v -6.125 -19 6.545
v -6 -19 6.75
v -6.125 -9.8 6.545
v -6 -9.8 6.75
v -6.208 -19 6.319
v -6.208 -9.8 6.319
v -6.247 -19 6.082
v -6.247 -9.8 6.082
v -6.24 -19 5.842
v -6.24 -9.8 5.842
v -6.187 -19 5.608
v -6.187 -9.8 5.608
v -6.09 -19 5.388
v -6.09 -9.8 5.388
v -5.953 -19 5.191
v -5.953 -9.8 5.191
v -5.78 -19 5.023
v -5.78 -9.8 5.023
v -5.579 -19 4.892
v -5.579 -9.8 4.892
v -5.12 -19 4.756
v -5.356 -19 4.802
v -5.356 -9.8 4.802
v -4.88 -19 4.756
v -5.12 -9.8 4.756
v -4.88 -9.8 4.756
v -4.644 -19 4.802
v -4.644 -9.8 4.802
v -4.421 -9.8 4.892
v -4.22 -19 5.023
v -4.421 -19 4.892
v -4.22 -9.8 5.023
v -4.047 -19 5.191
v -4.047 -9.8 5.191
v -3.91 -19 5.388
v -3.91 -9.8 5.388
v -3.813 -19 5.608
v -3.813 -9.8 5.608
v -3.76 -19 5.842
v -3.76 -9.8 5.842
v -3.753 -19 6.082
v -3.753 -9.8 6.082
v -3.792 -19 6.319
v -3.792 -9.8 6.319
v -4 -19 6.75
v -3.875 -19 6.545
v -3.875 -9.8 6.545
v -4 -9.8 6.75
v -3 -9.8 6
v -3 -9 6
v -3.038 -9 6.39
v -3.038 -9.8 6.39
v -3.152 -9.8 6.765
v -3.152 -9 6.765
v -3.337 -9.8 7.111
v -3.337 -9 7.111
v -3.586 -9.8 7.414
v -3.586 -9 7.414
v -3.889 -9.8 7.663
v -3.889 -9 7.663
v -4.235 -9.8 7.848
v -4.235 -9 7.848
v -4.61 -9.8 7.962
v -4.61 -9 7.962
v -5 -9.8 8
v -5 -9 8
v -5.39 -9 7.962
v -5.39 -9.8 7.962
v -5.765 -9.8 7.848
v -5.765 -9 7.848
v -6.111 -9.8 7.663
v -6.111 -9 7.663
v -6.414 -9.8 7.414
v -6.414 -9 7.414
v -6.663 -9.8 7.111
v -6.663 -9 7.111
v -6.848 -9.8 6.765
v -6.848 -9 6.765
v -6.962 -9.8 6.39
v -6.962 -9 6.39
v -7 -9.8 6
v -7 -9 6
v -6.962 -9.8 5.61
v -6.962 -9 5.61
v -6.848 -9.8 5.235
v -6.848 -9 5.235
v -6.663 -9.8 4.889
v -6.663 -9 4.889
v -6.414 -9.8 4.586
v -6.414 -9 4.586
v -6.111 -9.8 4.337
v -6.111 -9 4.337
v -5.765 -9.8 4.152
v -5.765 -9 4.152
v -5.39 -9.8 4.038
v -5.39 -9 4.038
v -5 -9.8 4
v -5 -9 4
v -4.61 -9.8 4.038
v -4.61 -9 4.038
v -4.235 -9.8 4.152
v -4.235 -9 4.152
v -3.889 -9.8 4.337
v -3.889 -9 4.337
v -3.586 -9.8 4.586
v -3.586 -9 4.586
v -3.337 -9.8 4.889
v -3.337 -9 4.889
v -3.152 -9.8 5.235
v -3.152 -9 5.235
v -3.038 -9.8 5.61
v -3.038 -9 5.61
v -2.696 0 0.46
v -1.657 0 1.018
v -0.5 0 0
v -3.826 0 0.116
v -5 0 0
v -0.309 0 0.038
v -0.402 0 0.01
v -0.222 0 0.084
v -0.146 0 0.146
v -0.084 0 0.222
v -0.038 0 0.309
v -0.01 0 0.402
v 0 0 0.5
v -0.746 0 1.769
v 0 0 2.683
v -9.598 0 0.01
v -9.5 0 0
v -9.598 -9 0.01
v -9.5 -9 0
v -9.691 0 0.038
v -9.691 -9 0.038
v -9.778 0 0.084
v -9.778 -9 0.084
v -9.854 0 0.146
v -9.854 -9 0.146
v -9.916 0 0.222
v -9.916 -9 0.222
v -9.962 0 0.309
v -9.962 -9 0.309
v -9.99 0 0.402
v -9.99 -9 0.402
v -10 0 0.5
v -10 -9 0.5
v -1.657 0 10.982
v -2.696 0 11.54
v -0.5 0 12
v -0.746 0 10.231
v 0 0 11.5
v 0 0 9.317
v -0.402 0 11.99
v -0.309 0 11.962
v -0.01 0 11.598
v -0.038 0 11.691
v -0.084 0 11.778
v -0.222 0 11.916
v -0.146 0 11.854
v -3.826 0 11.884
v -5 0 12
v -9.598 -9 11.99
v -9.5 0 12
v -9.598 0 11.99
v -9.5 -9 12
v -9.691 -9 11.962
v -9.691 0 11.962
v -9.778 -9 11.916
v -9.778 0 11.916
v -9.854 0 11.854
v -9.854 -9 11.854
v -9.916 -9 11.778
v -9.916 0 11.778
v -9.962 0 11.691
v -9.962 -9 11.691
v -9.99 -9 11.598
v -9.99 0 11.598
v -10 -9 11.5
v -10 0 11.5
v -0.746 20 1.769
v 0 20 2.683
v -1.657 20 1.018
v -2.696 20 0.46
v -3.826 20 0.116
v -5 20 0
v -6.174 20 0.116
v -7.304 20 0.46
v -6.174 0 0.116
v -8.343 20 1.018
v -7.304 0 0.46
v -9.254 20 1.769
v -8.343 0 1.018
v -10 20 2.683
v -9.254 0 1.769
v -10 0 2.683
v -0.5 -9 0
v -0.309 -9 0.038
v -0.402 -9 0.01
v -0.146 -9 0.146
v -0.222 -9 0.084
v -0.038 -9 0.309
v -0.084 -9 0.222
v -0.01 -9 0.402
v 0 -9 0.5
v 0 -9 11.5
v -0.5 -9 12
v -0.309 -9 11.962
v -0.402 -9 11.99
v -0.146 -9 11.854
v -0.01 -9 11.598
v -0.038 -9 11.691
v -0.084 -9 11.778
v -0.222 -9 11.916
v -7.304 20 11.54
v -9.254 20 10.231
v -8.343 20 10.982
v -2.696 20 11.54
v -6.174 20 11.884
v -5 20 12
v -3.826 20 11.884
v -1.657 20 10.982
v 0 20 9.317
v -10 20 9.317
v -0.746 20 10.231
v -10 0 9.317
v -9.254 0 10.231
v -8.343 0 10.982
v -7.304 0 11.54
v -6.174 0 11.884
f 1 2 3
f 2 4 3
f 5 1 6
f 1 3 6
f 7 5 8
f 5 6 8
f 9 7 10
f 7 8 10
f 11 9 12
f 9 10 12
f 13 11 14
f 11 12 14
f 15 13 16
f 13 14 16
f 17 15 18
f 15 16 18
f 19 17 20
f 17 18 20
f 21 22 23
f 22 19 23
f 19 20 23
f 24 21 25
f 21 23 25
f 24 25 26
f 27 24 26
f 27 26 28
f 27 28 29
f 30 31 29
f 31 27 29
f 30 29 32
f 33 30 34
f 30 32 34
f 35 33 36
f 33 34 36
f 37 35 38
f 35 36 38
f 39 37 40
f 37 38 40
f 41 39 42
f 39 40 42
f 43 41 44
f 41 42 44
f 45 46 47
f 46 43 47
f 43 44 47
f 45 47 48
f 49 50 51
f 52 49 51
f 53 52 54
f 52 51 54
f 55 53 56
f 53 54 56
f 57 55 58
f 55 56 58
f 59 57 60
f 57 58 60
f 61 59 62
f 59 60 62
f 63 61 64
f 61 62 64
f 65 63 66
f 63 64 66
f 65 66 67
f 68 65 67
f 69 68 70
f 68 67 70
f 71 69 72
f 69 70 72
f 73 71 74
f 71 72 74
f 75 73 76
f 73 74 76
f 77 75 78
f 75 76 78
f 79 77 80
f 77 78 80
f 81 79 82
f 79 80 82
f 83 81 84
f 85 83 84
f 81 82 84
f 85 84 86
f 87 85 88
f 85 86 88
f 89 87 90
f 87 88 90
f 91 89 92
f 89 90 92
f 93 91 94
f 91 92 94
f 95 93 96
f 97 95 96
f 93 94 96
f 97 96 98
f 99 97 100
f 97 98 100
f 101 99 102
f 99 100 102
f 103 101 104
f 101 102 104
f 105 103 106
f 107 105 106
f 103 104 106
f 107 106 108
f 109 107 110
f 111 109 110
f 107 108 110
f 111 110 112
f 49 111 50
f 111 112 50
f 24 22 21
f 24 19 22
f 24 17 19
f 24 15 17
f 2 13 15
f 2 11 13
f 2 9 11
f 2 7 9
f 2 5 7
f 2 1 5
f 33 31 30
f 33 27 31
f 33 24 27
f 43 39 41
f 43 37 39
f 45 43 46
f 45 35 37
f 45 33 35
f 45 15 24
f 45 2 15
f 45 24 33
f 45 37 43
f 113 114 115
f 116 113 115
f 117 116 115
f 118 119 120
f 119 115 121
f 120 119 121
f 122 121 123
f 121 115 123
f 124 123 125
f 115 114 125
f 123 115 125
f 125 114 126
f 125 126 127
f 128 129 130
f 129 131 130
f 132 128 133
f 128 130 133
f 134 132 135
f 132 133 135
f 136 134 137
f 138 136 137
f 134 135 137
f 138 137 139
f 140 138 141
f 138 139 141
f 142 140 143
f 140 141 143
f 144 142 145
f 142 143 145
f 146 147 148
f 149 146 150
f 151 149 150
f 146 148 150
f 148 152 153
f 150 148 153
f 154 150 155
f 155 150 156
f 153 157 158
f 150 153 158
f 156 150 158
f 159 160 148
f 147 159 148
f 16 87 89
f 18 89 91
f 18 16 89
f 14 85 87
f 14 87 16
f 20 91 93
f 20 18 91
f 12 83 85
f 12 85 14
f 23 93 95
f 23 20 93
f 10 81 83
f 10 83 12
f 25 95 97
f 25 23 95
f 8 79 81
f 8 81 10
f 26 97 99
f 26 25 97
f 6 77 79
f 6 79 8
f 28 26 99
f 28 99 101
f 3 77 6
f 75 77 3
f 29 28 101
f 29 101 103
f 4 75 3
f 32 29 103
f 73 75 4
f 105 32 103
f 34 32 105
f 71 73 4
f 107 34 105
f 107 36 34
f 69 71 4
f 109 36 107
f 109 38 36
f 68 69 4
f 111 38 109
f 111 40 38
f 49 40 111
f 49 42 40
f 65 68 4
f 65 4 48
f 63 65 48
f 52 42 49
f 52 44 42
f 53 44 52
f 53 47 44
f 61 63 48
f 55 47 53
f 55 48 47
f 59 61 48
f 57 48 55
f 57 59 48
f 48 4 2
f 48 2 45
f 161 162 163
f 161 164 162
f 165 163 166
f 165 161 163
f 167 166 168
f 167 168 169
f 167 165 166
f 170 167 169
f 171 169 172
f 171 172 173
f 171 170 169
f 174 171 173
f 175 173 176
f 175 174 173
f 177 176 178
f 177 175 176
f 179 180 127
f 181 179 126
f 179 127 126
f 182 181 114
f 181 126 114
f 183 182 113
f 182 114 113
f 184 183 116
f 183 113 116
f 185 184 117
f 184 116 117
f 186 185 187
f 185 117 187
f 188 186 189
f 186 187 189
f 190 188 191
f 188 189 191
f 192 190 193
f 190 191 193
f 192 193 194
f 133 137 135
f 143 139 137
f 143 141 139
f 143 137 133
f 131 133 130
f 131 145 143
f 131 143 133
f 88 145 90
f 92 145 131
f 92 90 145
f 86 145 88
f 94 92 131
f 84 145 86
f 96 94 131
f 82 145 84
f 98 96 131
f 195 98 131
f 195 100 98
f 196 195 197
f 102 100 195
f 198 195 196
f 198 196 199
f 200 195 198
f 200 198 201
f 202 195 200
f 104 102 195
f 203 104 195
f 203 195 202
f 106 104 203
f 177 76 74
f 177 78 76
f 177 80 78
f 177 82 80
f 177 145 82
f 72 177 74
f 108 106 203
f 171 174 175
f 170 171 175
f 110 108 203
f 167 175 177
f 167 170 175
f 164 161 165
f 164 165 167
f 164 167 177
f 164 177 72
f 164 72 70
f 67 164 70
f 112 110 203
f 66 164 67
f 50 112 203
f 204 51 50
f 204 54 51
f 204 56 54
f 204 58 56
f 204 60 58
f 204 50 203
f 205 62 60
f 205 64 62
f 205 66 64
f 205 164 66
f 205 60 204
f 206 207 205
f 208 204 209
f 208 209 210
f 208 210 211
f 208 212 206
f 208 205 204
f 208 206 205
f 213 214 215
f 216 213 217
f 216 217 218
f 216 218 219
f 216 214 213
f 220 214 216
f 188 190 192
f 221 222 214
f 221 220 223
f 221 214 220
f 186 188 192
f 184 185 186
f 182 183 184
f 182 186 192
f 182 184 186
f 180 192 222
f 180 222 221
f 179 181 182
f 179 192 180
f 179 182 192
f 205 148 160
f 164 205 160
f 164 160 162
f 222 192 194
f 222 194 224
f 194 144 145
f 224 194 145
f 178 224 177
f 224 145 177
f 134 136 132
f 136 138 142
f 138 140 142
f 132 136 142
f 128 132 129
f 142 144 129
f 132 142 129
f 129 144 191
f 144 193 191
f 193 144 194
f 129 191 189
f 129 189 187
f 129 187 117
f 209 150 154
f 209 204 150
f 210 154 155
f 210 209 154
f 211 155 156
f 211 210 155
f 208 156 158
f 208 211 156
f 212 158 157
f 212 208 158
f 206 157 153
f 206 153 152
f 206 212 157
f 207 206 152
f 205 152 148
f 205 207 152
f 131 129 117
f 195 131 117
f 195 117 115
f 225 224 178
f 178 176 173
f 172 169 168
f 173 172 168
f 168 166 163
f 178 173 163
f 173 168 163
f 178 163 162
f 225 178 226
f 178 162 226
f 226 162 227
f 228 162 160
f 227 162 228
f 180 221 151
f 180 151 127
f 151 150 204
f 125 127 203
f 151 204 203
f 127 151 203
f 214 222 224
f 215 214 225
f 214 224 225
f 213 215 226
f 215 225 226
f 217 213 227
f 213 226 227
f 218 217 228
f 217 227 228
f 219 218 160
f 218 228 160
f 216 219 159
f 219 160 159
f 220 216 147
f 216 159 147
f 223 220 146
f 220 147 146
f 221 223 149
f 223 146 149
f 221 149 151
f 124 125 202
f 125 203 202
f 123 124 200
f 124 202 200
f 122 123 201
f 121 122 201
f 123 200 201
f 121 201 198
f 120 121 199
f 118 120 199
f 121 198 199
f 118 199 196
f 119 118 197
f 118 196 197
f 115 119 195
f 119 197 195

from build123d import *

# Parameters (mm, degrees)
SKETCH2_W           = 10
SKETCH2_H           = 12
BOSS_EXTRUDE1_DEPTH = 15
FILLET2_R           = 2.5
FILLET3_R           = 2.5
FILLET4_R           = 2.5
FILLET5_R           = 2.5
BOSS_EXTRUDE2_DEPTH = 9
FILLET6_R           = 0.5
SKETCH4_R           = 2
SKETCH4_R_2         = 1.25
BOSS_EXTRUDE4_DEPTH = 0.8
SKETCH5_R           = 1.25
BOSS_EXTRUDE5_DEPTH = 10
CUT_EXTRUDE1_DEPTH  = 9.2
CUT_EXTRUDE2_DEPTH  = 15
BOSS_EXTRUDE7_DEPTH = 20


with BuildPart() as part:
    # Sketch2 → Boss-Extrude1 (new body)
    with BuildSketch(Plane(origin=(0, 0, 0), x_dir=(1, 0, 0), z_dir=(0, 1, 0))):
        with Locations((-5, -6)):
            Rectangle(SKETCH2_W, SKETCH2_H)
    extrude(amount=BOSS_EXTRUDE1_DEPTH)

    # Fillet2
    fillet2_edges = [part.edges().sort_by_distance(p)[0] for p in [
        (0, 7.5, 0),
    ]]
    fillet(fillet2_edges, radius=FILLET2_R)

    # Fillet3
    fillet3_edges = [part.edges().sort_by_distance(p)[0] for p in [
        (-10, 7.5, 0),
    ]]
    fillet(fillet3_edges, radius=FILLET3_R)

    # Fillet4
    fillet4_edges = [part.edges().sort_by_distance(p)[0] for p in [
        (-10, 7.5, 12),
    ]]
    fillet(fillet4_edges, radius=FILLET4_R)

    # Fillet5
    fillet5_edges = [part.edges().sort_by_distance(p)[0] for p in [
        (0, 7.5, 12),
    ]]
    fillet(fillet5_edges, radius=FILLET5_R)

    # Sketch3 → Boss-Extrude2 (add)
    with BuildSketch(Plane.XZ):
        with BuildLine():
            Line((0, 0), (0, 2.5))
            ThreePointArc((0, 2.5), (-0.732233047, 0.732233047), (-2.5, 0))
            Line((-2.5, 0), (0, 0))
        make_face()
        with BuildLine():
            ThreePointArc((-2.5, 0), (-0.732233047, 0.732233047), (0, 2.5))
            Line((0, 2.5), (-5, 6))
            Line((-5, 6), (-10, 2.5))
            ThreePointArc((-10, 2.5), (-9.267766953, 0.732233047), (-7.5, 0))
            Line((-7.5, 0), (-2.5, 0))
        make_face()
        with BuildLine():
            ThreePointArc((-7.5, 0), (-9.267766953, 0.732233047), (-10, 2.5))
            Line((-10, 2.5), (-10, 0))
            Line((-10, 0), (-7.5, 0))
        make_face()
        Polygon((-5, 6), (0, 2.5), (0, 9.5), align=None)
        Polygon((-10, 2.5), (-5, 6), (-10, 9.5), align=None)
        with BuildLine():
            Line((-10, 9.5), (-5, 6))
            Line((-5, 6), (0, 9.5))
            ThreePointArc((0, 9.5), (-0.732233047, 11.267766953), (-2.5, 12))
            Line((-2.5, 12), (-7.5, 12))
            ThreePointArc((-7.5, 12), (-9.267766953, 11.267766953), (-10, 9.5))
        make_face()
        with BuildLine():
            Line((-10, 12), (-10, 9.5))
            ThreePointArc((-10, 9.5), (-9.267766953, 11.267766953), (-7.5, 12))
            Line((-7.5, 12), (-10, 12))
        make_face()
        with BuildLine():
            ThreePointArc((-2.5, 12), (-0.732233047, 11.267766953), (0, 9.5))
            Line((0, 9.5), (0, 12))
            Line((0, 12), (-2.5, 12))
        make_face()
    extrude(amount=BOSS_EXTRUDE2_DEPTH)

    # Fillet6
    fillet6_edges = [part.edges().sort_by_distance(p)[0] for p in [
        (0, -4.5, 12),
        (-10, -4.5, 12),
        (-10, -4.5, 0),
        (0, -4.5, 0),
    ]]
    fillet(fillet6_edges, radius=FILLET6_R)

    # Sketch4 → Boss-Extrude4 (add)
    with BuildSketch(Plane.XZ.offset(9)):
        with Locations((-5, 6)):
            Circle(SKETCH4_R)
        with Locations((-5, 6)):
            Circle(SKETCH4_R_2, mode=Mode.SUBTRACT)
    extrude(amount=BOSS_EXTRUDE4_DEPTH)

    # Sketch5 → Boss-Extrude5 (add)
    with BuildSketch(Plane.XZ.offset(9)):
        with Locations((-5, 6)):
            Circle(SKETCH5_R)
    extrude(amount=BOSS_EXTRUDE5_DEPTH)

    # Sketch6 → Cut-Extrude1 (cut)
    with BuildSketch(Plane.XZ.offset(19)):
        with BuildLine():
            Line((-6, 6.75), (-5, 6.75))
            Line((-5, 6.75), (-4, 6.75))
            ThreePointArc((-4, 6.75), (-5, 7.25), (-6, 6.75))
        make_face()
    extrude(amount=-CUT_EXTRUDE1_DEPTH, mode=Mode.SUBTRACT)

    # Sketch8 → Cut-Extrude2 (cut)
    with BuildSketch(Plane(origin=(0, 15, 0), x_dir=(1, 0, 0), z_dir=(0, 1, 0))):
        with BuildLine():
            Line((-7.5, -12), (-2.5, -12))
            ThreePointArc((-2.5, -12), (-0.732233047, -11.267766953), (0, -9.5))
            Line((0, -9.5), (0, -2.5))
            ThreePointArc((0, -2.5), (-0.732233047, -0.732233047), (-2.5, 0))
            Line((-2.5, 0), (-7.5, 0))
            ThreePointArc((-7.5, 0), (-9.267766953, -0.732233047), (-10, -2.5))
            Line((-10, -2.5), (-10, -9.5))
            ThreePointArc((-10, -9.5), (-9.267766953, -11.267766953), (-7.5, -12))
        make_face()
    extrude(amount=-CUT_EXTRUDE2_DEPTH, mode=Mode.SUBTRACT)

    # Sketch9 → Boss-Extrude7 (add)
    with BuildSketch(Plane(origin=(0, 0, 0), x_dir=(1, 0, 0), z_dir=(0, 1, 0))):
        with BuildLine():
            Line((0, -9.31662479), (0, -2.68337521))
            ThreePointArc((0, -2.68337521), (-5, 0), (-10, -2.68337521))
            Line((-10, -2.68337521), (-10, -9.31662479))
            ThreePointArc((-10, -9.31662479), (-5, -12), (0, -9.31662479))
        make_face()
    extrude(amount=BOSS_EXTRUDE7_DEPTH)


solid = part.part
